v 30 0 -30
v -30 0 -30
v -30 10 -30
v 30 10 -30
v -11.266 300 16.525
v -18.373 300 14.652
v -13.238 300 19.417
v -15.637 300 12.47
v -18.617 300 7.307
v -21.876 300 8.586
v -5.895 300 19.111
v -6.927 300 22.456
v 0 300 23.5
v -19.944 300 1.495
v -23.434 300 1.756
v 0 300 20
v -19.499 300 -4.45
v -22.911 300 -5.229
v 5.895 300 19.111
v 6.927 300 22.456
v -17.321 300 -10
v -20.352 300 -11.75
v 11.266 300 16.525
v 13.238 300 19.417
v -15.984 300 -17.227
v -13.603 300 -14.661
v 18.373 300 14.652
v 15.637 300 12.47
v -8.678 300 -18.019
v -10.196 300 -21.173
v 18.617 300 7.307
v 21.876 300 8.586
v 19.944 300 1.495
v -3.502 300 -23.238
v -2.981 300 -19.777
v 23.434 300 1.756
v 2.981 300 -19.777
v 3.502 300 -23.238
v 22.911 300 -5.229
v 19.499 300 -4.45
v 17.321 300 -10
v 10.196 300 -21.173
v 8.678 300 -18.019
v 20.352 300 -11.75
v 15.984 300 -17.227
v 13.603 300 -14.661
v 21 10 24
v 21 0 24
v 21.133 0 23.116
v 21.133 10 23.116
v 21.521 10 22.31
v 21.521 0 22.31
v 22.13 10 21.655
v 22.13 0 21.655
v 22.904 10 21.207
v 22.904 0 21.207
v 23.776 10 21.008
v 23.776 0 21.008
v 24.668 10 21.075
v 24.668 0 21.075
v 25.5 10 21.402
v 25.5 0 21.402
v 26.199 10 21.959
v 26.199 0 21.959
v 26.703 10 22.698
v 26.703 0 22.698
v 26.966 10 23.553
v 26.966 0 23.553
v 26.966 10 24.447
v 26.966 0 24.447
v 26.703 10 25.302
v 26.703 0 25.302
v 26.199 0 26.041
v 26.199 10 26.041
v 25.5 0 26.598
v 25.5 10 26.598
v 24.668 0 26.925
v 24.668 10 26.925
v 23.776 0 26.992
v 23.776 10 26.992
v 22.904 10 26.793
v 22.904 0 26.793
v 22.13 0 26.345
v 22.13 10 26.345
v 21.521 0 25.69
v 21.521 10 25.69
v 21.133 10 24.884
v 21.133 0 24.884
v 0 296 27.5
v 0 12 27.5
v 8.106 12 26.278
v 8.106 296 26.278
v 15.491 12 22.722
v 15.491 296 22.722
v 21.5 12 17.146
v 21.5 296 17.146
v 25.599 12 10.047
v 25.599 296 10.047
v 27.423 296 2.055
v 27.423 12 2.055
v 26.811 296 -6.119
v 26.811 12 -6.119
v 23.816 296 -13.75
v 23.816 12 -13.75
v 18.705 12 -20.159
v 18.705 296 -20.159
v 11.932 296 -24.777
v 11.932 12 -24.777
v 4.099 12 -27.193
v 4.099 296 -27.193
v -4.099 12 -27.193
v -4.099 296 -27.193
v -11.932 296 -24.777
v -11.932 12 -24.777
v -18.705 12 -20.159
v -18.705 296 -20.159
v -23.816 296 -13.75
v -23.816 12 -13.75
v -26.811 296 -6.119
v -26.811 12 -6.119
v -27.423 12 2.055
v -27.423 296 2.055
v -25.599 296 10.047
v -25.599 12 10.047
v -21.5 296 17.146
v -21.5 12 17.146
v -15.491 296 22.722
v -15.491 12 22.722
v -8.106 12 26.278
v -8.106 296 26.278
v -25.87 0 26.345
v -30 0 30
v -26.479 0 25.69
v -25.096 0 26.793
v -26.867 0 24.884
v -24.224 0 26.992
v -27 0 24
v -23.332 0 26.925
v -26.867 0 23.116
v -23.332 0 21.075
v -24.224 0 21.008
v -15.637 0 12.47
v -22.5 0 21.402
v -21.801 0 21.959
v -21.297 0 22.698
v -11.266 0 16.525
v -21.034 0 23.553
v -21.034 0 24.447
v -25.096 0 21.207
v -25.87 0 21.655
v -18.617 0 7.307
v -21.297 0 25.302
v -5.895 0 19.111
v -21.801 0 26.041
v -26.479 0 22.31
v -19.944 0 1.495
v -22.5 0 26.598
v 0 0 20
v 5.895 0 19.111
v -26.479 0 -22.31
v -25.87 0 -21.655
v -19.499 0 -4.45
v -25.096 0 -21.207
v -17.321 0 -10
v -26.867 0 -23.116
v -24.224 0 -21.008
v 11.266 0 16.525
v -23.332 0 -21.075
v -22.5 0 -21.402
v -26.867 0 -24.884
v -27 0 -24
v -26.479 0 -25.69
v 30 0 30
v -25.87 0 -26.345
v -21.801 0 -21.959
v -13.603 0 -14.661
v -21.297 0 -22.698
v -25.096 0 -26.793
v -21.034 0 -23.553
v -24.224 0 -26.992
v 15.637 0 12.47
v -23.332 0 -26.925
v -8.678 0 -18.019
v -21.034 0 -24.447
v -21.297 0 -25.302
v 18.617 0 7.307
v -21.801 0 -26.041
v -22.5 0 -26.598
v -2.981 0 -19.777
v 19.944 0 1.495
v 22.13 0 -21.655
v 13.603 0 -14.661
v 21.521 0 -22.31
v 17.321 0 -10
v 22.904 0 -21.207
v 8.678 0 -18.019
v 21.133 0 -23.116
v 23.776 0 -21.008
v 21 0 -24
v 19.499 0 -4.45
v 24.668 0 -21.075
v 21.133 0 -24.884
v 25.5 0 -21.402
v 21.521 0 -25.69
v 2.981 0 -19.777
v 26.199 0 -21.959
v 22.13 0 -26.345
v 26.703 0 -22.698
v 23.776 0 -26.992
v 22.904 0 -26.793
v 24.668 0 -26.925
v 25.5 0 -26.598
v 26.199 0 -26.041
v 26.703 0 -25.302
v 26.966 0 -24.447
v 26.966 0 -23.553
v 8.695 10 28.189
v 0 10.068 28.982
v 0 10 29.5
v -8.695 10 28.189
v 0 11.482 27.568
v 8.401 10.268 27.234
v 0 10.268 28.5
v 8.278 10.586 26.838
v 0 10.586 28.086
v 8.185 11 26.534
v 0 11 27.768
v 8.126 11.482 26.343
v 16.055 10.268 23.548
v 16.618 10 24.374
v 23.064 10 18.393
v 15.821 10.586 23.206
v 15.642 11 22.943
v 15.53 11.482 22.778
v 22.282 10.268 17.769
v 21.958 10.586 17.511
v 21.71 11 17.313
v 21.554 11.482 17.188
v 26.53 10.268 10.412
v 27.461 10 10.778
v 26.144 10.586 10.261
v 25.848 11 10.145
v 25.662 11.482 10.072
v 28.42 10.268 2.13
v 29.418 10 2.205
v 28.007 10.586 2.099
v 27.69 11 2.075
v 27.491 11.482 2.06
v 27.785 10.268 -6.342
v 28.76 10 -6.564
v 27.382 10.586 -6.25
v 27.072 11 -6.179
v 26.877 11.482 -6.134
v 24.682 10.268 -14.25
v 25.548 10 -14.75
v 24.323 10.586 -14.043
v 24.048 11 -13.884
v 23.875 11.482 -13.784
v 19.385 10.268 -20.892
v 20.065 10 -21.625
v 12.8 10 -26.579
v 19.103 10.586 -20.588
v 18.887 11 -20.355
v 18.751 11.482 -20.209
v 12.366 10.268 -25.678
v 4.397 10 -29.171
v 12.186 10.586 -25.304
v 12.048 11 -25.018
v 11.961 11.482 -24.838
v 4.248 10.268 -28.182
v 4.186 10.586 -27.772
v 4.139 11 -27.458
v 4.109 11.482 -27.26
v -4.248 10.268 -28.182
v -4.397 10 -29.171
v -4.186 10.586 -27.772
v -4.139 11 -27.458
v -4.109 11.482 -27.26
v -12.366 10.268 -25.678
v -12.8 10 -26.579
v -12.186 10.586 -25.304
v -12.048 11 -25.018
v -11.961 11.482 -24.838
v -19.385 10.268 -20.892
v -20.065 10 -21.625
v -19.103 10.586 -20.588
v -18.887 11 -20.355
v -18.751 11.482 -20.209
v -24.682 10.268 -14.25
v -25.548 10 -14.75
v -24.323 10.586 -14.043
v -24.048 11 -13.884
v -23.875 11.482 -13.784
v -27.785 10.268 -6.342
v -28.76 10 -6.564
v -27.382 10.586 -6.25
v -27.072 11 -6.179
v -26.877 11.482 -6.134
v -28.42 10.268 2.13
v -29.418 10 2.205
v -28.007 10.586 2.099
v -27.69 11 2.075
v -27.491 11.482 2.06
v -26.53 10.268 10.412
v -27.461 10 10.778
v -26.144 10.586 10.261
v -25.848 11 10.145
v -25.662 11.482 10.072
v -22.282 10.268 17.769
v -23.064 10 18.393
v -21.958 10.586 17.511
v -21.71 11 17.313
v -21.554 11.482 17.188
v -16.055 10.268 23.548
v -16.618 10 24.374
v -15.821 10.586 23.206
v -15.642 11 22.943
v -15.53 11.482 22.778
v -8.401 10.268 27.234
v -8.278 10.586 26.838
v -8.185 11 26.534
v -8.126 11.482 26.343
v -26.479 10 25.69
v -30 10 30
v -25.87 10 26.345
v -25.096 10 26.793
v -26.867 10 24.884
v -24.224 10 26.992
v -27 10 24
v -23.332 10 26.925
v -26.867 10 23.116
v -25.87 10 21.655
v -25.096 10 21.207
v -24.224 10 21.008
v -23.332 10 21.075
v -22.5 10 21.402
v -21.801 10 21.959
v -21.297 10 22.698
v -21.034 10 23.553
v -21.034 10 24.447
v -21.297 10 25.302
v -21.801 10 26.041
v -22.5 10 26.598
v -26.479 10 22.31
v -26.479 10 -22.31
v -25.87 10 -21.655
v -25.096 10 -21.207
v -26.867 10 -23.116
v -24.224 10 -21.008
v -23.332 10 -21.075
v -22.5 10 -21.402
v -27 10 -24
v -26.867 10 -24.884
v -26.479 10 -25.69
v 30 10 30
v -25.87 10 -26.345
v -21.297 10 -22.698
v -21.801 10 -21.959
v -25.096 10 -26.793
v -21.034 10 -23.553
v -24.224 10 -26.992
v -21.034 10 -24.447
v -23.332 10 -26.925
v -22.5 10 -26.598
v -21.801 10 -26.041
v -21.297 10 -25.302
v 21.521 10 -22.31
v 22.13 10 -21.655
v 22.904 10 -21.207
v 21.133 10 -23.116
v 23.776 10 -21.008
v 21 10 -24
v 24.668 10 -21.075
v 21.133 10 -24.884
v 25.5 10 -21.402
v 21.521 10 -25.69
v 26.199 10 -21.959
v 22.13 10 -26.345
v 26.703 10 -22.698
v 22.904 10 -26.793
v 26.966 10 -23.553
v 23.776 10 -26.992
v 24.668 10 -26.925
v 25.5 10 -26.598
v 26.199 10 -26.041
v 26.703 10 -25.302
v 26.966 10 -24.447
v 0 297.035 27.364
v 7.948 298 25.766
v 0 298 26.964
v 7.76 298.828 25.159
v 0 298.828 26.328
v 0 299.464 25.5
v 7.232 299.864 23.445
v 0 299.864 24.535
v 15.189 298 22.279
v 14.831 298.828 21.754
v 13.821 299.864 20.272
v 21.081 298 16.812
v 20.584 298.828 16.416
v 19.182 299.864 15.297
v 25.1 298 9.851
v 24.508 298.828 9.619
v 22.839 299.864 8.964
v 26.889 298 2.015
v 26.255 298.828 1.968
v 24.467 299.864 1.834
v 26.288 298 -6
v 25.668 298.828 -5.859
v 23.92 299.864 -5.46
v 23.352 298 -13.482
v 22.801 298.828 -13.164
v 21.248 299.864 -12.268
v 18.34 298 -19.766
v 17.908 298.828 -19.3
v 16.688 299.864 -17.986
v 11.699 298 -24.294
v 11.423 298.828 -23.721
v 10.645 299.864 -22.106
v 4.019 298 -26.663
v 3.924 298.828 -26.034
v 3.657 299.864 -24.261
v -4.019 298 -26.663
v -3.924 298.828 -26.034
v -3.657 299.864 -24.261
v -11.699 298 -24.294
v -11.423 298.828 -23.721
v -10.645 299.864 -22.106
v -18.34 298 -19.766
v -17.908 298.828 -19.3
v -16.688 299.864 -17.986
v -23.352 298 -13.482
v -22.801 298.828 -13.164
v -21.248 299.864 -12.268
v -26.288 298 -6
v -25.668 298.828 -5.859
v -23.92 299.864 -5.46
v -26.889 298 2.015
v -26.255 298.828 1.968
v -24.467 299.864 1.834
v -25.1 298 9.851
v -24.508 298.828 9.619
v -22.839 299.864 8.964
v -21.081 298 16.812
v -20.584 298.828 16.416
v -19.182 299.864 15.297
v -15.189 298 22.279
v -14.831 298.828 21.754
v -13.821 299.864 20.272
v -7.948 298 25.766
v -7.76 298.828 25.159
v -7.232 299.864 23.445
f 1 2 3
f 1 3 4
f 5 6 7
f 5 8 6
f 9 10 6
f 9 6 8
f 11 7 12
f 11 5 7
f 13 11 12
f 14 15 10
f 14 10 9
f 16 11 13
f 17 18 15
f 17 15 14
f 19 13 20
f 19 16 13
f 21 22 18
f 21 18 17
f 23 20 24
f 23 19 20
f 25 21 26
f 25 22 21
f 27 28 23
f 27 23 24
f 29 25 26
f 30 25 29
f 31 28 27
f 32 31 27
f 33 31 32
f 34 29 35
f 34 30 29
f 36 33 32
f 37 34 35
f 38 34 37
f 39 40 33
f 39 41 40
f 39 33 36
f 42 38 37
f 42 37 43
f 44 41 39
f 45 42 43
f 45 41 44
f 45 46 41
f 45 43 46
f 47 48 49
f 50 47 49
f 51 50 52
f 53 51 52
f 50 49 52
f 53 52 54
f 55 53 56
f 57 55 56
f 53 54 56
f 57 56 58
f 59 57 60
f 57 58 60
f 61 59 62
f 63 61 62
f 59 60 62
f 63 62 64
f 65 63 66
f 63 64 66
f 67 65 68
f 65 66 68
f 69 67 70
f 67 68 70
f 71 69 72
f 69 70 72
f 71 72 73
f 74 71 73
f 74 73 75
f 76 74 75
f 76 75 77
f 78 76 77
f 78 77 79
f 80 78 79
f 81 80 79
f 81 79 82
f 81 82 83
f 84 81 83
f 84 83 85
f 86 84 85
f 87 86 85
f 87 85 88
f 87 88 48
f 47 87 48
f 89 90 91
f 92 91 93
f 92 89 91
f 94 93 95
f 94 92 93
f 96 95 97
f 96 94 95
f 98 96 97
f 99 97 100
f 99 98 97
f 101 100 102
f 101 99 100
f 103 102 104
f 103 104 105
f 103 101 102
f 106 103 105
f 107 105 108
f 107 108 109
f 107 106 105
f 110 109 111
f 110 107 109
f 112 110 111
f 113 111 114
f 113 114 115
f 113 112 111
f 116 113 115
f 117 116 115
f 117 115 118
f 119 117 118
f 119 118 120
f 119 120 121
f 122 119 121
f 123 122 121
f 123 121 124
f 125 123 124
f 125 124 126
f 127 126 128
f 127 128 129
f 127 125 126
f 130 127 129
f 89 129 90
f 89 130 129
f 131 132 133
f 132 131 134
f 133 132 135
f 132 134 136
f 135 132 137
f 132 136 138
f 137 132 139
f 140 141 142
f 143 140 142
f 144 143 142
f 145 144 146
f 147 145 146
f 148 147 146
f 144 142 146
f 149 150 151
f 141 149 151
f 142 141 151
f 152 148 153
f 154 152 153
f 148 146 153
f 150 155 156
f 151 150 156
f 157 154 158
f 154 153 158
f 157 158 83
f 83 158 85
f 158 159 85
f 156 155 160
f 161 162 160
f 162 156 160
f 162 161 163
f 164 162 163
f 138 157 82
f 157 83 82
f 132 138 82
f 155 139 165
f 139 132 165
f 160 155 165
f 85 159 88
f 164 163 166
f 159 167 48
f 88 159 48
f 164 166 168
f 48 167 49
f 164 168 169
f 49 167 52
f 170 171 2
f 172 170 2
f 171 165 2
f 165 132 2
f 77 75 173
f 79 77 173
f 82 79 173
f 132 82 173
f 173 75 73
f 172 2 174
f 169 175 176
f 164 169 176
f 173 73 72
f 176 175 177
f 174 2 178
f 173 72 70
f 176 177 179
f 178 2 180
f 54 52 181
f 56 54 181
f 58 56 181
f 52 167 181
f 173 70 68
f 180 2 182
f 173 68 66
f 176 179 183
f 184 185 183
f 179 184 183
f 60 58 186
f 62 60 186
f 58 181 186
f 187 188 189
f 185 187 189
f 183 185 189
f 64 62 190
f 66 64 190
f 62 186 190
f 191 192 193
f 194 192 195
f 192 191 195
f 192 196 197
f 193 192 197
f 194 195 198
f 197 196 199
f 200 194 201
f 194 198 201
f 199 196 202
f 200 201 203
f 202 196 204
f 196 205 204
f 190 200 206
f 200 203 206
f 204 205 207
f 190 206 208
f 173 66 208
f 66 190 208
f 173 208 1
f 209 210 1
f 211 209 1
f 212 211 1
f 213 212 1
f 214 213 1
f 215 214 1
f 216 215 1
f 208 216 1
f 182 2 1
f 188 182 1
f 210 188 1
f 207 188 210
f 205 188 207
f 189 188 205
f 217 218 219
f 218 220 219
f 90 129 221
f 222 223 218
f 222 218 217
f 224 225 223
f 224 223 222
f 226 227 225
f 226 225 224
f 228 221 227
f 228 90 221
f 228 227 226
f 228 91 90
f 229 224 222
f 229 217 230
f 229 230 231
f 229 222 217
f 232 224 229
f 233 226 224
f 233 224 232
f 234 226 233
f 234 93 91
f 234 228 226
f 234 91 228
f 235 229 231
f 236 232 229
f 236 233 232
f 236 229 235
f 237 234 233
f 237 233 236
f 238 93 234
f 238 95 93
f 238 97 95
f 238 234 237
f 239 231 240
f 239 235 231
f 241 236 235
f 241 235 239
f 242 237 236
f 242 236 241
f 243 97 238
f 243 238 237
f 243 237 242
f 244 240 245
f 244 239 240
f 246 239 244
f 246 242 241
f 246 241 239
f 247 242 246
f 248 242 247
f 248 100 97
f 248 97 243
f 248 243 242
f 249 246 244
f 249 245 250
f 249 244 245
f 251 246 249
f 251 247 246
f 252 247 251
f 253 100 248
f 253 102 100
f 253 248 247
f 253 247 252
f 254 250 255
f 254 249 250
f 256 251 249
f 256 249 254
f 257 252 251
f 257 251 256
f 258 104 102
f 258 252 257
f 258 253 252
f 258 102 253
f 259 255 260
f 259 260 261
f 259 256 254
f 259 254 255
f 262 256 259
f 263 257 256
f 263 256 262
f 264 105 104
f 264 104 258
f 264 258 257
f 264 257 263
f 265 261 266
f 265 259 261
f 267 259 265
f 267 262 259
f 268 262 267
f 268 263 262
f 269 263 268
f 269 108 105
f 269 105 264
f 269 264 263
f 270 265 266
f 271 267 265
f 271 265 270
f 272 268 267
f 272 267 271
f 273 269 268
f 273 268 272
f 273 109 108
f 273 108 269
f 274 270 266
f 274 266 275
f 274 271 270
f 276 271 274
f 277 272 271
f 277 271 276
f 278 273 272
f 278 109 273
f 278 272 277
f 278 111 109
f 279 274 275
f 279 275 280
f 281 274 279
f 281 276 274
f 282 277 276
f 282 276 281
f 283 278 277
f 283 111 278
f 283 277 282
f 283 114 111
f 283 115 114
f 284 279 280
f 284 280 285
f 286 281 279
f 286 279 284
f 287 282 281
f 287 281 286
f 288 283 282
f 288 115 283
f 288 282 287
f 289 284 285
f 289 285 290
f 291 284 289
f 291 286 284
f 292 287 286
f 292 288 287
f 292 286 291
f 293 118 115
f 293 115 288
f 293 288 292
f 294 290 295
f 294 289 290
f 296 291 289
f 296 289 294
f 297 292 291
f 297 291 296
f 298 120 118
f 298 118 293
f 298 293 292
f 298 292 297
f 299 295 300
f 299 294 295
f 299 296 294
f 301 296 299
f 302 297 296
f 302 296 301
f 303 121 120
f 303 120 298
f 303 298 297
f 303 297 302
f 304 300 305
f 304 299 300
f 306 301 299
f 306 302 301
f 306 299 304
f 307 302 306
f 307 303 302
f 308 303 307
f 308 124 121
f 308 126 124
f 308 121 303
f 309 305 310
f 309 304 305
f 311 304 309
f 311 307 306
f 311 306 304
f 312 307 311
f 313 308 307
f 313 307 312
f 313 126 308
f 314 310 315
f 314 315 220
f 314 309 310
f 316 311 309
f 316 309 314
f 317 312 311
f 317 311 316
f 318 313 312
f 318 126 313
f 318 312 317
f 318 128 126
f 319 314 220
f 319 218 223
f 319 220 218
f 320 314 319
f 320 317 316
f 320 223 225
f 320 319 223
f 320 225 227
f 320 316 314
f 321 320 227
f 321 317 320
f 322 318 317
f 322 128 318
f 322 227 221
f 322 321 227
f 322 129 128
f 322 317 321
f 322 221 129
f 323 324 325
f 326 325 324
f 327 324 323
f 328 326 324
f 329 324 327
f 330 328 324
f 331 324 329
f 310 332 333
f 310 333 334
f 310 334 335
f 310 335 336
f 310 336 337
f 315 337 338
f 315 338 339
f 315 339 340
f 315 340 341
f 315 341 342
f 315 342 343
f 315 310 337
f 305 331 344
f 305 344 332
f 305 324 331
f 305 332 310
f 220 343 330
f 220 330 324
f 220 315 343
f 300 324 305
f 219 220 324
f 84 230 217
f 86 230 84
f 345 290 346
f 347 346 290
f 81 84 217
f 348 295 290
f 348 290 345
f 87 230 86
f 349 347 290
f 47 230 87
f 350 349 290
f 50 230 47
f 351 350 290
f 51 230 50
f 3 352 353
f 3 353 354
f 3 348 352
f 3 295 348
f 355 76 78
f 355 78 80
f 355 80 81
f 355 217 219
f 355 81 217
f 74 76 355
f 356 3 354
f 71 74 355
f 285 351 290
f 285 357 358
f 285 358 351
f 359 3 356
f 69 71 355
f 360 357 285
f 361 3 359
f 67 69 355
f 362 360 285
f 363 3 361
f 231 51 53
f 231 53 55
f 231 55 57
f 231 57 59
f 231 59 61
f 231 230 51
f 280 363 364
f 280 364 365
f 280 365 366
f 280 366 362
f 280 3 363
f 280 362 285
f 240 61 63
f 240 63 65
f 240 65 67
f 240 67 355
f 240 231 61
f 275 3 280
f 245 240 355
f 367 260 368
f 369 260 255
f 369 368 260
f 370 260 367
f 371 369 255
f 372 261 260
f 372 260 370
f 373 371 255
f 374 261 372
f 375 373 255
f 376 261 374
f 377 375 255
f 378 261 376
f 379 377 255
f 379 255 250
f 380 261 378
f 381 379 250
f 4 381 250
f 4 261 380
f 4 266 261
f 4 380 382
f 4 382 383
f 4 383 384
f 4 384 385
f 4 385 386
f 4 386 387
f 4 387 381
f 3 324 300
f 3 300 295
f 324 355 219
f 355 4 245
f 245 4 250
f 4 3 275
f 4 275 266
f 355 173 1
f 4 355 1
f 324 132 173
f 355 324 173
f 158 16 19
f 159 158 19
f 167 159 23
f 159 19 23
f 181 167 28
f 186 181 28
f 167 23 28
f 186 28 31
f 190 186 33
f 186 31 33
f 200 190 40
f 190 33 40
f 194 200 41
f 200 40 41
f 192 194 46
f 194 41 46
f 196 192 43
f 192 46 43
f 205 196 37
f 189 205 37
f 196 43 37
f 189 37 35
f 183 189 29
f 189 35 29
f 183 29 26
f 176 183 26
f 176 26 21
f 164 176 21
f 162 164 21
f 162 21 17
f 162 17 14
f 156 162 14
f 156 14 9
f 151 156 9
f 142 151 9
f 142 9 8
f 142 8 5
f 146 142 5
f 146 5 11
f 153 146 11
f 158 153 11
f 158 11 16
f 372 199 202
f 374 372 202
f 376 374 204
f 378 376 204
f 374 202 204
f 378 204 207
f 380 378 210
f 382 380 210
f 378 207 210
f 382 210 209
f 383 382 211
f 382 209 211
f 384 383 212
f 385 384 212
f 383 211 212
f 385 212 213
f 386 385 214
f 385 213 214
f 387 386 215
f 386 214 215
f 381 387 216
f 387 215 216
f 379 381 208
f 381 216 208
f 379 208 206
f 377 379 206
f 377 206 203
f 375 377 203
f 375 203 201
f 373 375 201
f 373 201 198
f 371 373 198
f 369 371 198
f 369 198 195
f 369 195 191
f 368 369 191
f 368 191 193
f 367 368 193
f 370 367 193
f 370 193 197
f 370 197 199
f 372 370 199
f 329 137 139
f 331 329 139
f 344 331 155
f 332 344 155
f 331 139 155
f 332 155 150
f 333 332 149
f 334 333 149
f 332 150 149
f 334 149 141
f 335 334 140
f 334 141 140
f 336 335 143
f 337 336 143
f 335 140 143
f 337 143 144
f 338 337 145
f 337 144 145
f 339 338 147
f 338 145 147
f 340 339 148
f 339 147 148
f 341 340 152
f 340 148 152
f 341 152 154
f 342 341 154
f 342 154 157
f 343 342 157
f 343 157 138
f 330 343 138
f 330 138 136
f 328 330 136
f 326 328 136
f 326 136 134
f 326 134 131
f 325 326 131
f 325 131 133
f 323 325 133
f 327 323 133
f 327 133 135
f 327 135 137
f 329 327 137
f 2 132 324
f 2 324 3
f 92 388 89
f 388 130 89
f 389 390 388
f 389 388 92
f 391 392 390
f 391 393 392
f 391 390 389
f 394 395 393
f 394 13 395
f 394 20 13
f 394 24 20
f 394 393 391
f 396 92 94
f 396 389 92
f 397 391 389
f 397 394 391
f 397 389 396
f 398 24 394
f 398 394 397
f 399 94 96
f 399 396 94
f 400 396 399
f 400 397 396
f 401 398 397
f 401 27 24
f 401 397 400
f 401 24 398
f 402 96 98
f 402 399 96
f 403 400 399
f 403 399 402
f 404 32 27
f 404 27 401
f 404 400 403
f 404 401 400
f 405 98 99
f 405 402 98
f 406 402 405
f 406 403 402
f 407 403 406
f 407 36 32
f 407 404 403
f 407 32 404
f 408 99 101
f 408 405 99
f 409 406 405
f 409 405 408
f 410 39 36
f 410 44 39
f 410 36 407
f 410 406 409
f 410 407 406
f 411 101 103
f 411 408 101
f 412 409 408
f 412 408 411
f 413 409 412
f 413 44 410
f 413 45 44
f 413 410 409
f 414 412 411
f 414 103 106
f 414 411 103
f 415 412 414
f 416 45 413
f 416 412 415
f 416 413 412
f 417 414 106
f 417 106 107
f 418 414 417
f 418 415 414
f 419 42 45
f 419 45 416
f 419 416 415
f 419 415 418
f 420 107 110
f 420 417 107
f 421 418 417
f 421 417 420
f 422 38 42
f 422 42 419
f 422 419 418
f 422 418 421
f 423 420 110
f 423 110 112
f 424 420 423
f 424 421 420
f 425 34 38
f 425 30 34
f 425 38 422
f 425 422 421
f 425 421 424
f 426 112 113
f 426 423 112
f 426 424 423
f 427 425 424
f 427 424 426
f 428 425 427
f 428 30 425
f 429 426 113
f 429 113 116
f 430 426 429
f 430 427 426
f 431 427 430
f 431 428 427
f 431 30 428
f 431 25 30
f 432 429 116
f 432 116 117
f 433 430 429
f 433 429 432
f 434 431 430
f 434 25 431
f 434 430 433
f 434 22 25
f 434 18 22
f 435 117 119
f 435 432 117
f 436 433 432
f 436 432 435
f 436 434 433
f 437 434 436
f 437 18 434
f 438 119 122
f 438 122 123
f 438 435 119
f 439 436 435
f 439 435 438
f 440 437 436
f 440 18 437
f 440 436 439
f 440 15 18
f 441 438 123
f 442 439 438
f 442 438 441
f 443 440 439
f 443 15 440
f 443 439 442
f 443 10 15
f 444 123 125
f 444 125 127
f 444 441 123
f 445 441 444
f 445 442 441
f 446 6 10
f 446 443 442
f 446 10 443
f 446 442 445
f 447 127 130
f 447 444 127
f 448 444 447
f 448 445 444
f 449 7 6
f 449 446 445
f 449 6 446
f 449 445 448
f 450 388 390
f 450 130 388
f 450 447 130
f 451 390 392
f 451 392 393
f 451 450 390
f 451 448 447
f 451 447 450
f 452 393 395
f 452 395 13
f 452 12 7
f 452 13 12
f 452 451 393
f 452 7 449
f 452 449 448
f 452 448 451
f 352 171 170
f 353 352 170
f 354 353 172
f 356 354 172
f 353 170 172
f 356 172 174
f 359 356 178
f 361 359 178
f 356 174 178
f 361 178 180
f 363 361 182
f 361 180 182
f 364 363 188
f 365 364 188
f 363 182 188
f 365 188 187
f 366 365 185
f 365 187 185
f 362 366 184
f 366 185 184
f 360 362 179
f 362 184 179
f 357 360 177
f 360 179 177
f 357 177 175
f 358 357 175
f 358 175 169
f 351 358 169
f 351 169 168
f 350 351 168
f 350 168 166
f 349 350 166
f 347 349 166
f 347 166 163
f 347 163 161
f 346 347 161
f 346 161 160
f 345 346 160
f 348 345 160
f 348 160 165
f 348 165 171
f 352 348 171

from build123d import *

# Parameters (mm, degrees)
SZKIC1_W                    = 60
SZKIC1_H                    = 60
DODANIE_WYCI_GNI_CIE1_DEPTH = 300
SZKIC2_OUTSIDE_W            = 124.354
SZKIC2_OUTSIDE_H            = 124.354
SZKIC2_OUTSIDE_R            = 27.5
WYTNIJ_WYCI_GNI_CIE1_DEPTH  = 290
SZKIC5_R                    = 20
WYTNIJ_WYCI_GNI_CIE3_DEPTH  = 303.985148151
ZAOKR_GLENIE2_R             = 2
ZAOKR_GLENIE3_R             = 4
OTWORY_USTALAJ_CE_6_0MM1_D  = 6


with BuildPart() as part:
    # Szkic1 → Dodanie-wyciągnięcie1 (new body)
    with BuildSketch(Plane(origin=(0, 0, 0), x_dir=(1, 0, 0), z_dir=(0, 1, 0))):
        Rectangle(SZKIC1_W, SZKIC1_H)
    extrude(amount=DODANIE_WYCI_GNI_CIE1_DEPTH)

    # Szkic2 outside → Wytnij-wyciągnięcie1 (cut)
    with BuildSketch(Plane(origin=(0, 300, 0), x_dir=(1, 0, 0), z_dir=(0, 1, 0))):
        Rectangle(SZKIC2_OUTSIDE_W, SZKIC2_OUTSIDE_H)
        with Locations(Location((0, 0, 0), (0, 0, 270))):
            Circle(SZKIC2_OUTSIDE_R, mode=Mode.SUBTRACT)
    extrude(amount=-WYTNIJ_WYCI_GNI_CIE1_DEPTH, mode=Mode.SUBTRACT)

    # Szkic5 → Wytnij-wyciągnięcie3 (cut, through all)
    with BuildSketch(Plane(origin=(0, 300, 0), x_dir=(1, 0, 0), z_dir=(0, 1, 0))):
        with Locations(Location((0, 0, 0), (0, 0, 270))):
            Circle(SZKIC5_R)
    extrude(amount=-WYTNIJ_WYCI_GNI_CIE3_DEPTH, mode=Mode.SUBTRACT)

    # Zaokrąglenie2
    zaokr_glenie2_edges = [part.edges().sort_by_distance(p)[0] for p in [
        (0, 10, -27.5),
    ]]
    fillet(zaokr_glenie2_edges, radius=ZAOKR_GLENIE2_R)

    # Zaokrąglenie3
    zaokr_glenie3_edges = [part.edges().sort_by_distance(p)[0] for p in [
        (0, 300, -27.5),
    ]]
    fillet(zaokr_glenie3_edges, radius=ZAOKR_GLENIE3_R)

    # Otwory ustalające Ø6.0mm1 (through all)
    with Locations(Plane(origin=(0, 10, 0), x_dir=(1, 0, 0), z_dir=(0, 1, 0))):
        with Locations((-24, -24), (-24, 24), (24, 24), (24, -24)):
            Hole(OTWORY_USTALAJ_CE_6_0MM1_D / 2)


solid = part.part
